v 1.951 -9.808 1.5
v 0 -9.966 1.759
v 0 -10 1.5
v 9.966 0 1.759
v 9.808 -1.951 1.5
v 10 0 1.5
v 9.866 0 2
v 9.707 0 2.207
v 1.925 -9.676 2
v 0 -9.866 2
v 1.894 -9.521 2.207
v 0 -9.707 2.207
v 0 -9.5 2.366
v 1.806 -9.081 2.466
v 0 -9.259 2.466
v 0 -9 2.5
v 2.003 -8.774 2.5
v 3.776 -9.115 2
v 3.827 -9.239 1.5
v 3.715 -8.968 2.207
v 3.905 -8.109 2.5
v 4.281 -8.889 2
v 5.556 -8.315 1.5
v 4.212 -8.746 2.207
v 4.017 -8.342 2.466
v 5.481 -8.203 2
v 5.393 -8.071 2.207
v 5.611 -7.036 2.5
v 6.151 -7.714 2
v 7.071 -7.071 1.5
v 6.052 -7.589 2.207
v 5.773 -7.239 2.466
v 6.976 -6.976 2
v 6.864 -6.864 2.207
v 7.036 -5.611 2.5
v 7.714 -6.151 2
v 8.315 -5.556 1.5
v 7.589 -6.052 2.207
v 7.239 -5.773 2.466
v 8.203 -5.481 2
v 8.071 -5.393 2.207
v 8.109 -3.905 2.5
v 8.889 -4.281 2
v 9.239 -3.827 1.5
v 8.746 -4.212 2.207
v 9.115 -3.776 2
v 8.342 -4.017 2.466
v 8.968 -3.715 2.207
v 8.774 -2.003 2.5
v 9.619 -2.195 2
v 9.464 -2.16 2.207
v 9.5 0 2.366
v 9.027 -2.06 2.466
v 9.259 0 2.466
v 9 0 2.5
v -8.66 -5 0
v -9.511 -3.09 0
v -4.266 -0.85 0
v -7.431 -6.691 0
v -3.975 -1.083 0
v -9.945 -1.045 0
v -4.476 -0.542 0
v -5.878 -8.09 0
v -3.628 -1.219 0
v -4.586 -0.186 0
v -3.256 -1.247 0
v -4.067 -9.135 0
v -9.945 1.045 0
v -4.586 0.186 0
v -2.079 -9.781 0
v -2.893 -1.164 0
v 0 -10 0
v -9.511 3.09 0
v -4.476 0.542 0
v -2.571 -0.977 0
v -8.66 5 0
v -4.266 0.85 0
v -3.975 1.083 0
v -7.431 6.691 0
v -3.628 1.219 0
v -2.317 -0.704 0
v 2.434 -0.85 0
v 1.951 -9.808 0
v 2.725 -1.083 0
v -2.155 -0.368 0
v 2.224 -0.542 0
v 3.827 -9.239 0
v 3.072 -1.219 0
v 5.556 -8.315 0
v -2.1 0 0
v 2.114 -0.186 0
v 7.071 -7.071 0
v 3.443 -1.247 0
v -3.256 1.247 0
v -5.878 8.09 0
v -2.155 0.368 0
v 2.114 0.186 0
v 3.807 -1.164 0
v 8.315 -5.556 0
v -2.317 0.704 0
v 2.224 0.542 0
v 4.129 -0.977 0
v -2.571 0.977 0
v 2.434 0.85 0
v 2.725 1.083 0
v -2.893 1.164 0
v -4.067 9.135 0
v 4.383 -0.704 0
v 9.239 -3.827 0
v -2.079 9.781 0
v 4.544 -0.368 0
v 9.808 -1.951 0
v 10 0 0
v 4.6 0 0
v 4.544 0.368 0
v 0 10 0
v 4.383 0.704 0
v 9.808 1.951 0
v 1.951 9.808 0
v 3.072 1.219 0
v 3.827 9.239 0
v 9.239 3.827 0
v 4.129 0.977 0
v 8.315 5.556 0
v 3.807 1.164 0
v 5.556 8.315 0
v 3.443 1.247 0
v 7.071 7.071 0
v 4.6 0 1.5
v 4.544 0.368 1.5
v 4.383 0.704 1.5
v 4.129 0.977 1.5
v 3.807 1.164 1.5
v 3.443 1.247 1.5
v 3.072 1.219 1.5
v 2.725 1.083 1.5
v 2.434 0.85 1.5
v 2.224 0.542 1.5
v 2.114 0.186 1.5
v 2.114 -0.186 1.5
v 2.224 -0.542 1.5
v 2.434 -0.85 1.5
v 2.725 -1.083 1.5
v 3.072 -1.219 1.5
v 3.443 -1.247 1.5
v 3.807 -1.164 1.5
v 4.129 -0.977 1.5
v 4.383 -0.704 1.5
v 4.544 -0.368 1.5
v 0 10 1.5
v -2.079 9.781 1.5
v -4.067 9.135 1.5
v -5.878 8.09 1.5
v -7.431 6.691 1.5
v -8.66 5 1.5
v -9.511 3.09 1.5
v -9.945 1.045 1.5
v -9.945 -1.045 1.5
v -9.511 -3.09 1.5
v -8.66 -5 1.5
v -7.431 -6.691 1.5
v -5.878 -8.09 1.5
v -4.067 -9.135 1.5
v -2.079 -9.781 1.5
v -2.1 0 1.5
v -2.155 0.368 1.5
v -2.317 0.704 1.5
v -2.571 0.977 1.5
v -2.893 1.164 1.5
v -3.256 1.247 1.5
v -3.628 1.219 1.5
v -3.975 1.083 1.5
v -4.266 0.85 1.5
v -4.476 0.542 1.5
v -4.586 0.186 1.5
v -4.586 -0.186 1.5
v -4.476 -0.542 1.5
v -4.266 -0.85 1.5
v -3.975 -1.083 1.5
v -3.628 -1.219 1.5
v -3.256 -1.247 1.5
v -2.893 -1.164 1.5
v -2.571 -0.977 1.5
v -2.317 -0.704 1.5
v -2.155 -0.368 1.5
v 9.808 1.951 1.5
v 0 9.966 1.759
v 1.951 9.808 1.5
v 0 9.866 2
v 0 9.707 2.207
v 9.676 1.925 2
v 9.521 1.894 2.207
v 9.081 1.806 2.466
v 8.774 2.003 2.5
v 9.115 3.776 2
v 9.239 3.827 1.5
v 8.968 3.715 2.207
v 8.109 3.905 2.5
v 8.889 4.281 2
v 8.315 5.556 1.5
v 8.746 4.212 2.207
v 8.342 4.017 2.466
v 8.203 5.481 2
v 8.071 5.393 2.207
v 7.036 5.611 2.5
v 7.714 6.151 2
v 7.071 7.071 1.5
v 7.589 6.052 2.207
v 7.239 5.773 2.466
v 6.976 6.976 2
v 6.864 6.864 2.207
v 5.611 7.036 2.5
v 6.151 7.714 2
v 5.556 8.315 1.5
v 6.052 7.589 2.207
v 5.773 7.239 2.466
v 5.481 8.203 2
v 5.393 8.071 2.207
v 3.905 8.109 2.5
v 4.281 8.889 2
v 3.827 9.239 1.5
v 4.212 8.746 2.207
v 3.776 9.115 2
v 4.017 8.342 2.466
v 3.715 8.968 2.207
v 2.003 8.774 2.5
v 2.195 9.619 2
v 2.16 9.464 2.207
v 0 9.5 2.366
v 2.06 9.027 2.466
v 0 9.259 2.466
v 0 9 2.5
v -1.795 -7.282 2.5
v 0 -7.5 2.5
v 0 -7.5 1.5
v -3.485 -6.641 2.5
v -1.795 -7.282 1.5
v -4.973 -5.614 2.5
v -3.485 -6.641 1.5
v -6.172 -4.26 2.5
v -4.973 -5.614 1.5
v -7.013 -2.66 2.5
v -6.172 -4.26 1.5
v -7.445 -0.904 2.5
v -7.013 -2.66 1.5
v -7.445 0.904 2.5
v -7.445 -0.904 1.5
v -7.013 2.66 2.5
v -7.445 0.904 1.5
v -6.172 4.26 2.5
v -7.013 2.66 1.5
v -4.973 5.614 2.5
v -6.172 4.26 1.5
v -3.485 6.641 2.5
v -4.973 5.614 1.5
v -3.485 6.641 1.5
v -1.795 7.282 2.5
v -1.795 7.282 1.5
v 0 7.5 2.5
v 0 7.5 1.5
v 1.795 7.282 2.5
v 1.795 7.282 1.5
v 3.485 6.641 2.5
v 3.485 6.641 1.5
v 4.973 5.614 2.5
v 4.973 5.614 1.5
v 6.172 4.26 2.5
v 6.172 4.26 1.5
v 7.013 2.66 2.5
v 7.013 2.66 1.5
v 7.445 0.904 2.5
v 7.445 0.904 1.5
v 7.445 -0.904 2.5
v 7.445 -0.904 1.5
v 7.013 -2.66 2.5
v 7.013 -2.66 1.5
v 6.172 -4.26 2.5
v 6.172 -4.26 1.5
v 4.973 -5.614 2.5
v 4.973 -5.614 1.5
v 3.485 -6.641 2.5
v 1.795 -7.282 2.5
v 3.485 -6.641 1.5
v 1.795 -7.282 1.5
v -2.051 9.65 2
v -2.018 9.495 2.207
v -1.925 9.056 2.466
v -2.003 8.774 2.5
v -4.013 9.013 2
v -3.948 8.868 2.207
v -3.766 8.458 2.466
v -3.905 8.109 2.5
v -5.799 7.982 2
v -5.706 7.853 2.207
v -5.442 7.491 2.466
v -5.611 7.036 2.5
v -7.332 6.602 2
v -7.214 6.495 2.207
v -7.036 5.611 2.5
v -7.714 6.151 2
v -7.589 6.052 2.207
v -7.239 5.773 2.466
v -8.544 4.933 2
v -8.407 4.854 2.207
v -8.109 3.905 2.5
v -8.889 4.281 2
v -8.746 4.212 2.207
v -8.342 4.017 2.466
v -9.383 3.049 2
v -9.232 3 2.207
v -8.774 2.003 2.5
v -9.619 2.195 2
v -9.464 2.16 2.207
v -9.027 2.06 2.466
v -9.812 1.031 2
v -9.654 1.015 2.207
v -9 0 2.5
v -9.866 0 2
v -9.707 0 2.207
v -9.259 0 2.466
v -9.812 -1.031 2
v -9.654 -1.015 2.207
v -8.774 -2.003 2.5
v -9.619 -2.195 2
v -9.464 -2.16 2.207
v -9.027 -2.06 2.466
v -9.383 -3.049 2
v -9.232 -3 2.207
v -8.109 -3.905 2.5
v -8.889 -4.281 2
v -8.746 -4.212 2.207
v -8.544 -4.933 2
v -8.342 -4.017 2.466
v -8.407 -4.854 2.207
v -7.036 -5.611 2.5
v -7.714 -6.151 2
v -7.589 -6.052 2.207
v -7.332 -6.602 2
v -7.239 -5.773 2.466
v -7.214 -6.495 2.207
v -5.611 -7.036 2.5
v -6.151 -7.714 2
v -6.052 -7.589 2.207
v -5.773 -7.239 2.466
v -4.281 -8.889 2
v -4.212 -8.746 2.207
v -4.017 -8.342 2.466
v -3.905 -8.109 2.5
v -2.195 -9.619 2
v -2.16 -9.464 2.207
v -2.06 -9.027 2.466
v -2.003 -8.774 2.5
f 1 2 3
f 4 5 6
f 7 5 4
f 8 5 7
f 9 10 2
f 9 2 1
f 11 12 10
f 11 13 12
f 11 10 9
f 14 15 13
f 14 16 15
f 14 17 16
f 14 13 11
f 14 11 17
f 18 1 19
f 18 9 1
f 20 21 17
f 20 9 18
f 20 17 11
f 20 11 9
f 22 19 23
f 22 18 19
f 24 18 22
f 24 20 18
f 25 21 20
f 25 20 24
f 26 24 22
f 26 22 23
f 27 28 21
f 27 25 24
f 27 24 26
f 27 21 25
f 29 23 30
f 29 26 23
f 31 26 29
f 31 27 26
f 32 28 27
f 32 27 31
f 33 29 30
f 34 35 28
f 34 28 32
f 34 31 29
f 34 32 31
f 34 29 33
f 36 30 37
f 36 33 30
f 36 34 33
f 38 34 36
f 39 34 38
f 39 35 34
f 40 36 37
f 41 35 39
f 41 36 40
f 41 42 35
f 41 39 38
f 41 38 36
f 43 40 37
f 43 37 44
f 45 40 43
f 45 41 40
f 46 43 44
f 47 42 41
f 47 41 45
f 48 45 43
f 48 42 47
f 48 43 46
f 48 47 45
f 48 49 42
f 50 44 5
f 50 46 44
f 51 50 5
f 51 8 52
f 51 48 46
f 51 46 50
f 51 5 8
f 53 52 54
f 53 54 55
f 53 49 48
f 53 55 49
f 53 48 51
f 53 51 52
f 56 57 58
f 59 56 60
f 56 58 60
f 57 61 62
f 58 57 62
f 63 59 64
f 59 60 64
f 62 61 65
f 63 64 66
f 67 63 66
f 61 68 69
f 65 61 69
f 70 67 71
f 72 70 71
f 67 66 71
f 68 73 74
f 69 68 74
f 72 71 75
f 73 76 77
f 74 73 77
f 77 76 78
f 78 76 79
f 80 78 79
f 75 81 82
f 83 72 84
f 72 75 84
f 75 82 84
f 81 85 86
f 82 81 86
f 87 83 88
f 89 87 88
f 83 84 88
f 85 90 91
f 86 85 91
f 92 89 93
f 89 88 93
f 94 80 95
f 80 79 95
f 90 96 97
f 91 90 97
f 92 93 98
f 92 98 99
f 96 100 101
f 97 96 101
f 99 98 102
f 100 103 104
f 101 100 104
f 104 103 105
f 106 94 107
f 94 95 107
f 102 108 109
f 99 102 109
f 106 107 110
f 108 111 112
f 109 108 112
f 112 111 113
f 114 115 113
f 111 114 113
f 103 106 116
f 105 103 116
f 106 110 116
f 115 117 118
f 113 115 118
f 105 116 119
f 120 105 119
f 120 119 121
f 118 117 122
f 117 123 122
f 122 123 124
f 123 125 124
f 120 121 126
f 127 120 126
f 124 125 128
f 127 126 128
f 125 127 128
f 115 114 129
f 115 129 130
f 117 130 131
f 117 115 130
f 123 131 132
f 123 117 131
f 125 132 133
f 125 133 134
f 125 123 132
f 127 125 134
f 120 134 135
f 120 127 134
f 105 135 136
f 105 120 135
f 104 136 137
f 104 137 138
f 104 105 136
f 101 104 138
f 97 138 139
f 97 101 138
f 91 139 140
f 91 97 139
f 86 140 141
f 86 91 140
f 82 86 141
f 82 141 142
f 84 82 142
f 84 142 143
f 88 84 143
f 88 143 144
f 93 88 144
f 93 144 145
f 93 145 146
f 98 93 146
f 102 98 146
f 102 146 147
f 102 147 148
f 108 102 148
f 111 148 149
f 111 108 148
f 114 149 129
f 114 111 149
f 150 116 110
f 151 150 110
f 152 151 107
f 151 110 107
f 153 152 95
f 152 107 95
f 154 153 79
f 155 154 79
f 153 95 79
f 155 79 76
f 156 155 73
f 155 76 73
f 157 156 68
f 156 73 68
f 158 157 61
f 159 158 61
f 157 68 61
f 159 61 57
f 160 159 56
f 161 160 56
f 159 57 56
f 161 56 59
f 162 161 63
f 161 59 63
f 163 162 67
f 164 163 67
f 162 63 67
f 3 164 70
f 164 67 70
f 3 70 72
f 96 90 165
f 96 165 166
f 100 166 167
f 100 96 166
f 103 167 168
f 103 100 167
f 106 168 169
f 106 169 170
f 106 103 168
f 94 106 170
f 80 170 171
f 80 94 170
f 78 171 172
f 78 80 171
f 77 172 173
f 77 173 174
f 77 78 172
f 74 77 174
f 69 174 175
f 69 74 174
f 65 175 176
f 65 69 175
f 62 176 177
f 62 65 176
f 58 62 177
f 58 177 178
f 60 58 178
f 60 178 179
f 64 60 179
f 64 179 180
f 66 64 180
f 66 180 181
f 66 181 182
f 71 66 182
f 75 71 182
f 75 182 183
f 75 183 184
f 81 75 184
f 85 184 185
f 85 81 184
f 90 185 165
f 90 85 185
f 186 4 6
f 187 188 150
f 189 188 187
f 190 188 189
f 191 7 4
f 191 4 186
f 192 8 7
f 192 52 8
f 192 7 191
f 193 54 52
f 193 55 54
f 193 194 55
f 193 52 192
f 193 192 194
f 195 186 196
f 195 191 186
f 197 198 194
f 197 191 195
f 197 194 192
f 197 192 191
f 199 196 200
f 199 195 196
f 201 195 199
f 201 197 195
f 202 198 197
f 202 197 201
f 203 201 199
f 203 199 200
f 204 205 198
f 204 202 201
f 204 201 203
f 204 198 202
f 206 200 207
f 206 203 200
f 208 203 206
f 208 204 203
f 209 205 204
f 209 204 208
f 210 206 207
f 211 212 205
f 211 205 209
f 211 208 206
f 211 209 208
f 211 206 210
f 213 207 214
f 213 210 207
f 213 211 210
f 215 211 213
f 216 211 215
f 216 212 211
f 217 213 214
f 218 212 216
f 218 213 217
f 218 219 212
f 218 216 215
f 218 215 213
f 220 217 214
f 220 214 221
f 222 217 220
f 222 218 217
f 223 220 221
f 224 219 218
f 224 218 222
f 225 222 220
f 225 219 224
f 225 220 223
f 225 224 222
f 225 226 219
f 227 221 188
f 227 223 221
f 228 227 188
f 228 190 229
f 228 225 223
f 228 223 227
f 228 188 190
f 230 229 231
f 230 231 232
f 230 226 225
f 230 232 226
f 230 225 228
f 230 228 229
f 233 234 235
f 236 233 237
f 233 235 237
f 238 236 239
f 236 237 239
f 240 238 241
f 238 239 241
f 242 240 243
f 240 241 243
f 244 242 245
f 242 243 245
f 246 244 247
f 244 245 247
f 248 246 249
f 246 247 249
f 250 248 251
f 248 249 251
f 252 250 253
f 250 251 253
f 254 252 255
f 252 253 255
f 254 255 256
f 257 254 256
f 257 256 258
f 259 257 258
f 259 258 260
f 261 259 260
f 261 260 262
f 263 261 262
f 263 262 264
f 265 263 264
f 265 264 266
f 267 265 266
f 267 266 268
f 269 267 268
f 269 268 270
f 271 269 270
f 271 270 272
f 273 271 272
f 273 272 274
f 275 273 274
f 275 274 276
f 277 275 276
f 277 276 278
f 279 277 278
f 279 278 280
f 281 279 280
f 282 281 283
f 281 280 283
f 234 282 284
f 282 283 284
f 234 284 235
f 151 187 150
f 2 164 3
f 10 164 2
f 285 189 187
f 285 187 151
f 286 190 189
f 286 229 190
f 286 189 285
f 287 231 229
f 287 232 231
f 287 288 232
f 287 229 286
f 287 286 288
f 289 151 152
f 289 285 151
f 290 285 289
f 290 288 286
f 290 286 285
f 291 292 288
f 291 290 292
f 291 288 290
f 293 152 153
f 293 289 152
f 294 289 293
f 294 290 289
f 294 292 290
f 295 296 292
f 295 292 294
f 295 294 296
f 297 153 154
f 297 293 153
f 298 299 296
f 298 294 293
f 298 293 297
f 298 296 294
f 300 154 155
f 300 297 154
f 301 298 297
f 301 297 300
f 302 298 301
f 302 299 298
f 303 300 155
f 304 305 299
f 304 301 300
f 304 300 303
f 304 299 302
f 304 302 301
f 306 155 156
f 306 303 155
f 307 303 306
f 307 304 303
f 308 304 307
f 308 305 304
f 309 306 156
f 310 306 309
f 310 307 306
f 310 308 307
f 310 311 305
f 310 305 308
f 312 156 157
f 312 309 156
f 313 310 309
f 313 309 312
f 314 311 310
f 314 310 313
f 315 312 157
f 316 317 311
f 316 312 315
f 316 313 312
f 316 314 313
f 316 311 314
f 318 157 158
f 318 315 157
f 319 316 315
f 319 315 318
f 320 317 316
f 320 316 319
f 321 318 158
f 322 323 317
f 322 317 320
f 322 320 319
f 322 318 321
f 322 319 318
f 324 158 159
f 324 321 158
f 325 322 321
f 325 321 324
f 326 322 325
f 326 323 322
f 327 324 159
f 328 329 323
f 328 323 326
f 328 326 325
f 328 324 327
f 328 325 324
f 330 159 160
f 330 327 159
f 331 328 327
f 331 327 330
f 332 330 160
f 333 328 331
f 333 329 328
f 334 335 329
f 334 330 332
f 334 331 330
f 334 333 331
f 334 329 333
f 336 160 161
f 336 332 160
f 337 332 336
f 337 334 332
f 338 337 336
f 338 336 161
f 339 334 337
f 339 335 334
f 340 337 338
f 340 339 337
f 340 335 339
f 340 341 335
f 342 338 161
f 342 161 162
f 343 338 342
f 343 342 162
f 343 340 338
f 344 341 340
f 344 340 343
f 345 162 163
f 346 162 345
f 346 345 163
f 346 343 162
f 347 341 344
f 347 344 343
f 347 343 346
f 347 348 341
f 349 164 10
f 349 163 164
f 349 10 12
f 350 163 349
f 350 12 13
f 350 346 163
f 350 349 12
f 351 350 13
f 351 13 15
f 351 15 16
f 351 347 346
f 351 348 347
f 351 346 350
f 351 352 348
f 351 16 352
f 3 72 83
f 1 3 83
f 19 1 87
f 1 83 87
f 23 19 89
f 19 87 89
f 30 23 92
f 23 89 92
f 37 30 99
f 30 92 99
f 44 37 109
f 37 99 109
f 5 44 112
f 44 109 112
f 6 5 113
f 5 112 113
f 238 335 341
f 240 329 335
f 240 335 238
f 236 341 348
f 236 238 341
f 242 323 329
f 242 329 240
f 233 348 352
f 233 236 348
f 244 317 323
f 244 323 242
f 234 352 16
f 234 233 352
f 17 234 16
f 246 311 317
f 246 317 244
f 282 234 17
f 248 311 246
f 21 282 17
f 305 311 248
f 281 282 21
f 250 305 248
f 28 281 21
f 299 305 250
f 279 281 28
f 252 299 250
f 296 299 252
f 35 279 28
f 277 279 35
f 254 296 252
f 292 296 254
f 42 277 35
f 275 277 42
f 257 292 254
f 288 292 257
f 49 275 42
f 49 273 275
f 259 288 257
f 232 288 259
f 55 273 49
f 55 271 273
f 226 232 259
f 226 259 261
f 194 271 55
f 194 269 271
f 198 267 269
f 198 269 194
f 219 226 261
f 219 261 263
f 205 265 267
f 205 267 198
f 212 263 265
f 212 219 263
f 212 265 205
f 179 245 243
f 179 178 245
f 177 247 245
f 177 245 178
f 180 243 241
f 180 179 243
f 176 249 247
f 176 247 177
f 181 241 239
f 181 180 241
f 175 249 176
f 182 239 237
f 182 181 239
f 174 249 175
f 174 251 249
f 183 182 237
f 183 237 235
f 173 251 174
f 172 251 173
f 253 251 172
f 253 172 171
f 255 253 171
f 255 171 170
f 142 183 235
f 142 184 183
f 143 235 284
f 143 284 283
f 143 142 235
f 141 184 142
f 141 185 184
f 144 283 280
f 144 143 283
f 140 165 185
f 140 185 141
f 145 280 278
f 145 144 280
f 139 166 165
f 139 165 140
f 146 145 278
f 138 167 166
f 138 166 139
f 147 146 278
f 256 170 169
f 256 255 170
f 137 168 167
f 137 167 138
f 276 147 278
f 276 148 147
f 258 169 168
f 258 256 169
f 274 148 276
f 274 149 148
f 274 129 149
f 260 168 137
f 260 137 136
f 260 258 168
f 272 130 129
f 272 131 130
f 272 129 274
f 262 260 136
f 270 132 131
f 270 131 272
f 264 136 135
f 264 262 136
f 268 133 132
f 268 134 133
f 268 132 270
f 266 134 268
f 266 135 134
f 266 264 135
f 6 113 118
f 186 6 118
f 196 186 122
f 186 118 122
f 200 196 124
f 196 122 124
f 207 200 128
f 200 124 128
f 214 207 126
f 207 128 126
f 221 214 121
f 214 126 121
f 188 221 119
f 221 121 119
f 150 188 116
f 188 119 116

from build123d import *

# Parameters (mm, degrees)
F1_DEPTH = 2.5
F0_R     = 1.25
F2_DEPTH = 1.5
F3_R     = 1


with BuildPart() as f1:
    # F0 (on Top) → F1 (new body)
    with BuildSketch(Plane.XY):
        with BuildLine():
            ThreePointArc((0, 7.5), (5.3033008589, 5.3033008589), (7.5, 0))
            ThreePointArc((7.5, 0), (5.3033008589, -5.3033008589), (0, -7.5))
            Line((0, -7.5), (0, -10))
            ThreePointArc((0, -10), (7.0710678119, -7.0710678119), (10, 0))
            ThreePointArc((10, 0), (7.0710678119, 7.0710678119), (0, 10))
            Line((0, 10), (0, 7.5))
        make_face()
        with BuildLine():
            ThreePointArc((0, -7.5), (-7.5, 0), (0, 7.5))
            Line((0, 7.5), (0, 10))
            ThreePointArc((0, 10), (-10, 0), (0, -10))
            Line((0, -10), (0, -7.5))
        make_face()
    extrude(amount=F1_DEPTH)

    # F0 (on Top) → F2 (join)
    with BuildSketch(Plane.XY):
        with BuildLine():
            Line((0, -7.5), (0, 7.5))
            ThreePointArc((0, 7.5), (-7.5, 0), (0, -7.5))
        make_face()
        with Locations((-3.3498867415, 0)):
            Circle(F0_R, mode=Mode.SUBTRACT)
        with BuildLine():
            ThreePointArc((0, -7.5), (5.3033008589, -5.3033008589), (7.5, 0))
            ThreePointArc((7.5, 0), (5.3033008589, 5.3033008589), (0, 7.5))
            Line((0, 7.5), (0, -7.5))
        make_face()
        with Locations((3.3498867415, 0)):
            Circle(F0_R, mode=Mode.SUBTRACT)
    extrude(amount=F2_DEPTH)

    # F3
    f3_edges = [f1.edges().sort_by_distance(p)[0] for p in [
        (-10, 0, 2.5),
    ]]
    fillet(f3_edges, radius=F3_R)


solid = f1.part
